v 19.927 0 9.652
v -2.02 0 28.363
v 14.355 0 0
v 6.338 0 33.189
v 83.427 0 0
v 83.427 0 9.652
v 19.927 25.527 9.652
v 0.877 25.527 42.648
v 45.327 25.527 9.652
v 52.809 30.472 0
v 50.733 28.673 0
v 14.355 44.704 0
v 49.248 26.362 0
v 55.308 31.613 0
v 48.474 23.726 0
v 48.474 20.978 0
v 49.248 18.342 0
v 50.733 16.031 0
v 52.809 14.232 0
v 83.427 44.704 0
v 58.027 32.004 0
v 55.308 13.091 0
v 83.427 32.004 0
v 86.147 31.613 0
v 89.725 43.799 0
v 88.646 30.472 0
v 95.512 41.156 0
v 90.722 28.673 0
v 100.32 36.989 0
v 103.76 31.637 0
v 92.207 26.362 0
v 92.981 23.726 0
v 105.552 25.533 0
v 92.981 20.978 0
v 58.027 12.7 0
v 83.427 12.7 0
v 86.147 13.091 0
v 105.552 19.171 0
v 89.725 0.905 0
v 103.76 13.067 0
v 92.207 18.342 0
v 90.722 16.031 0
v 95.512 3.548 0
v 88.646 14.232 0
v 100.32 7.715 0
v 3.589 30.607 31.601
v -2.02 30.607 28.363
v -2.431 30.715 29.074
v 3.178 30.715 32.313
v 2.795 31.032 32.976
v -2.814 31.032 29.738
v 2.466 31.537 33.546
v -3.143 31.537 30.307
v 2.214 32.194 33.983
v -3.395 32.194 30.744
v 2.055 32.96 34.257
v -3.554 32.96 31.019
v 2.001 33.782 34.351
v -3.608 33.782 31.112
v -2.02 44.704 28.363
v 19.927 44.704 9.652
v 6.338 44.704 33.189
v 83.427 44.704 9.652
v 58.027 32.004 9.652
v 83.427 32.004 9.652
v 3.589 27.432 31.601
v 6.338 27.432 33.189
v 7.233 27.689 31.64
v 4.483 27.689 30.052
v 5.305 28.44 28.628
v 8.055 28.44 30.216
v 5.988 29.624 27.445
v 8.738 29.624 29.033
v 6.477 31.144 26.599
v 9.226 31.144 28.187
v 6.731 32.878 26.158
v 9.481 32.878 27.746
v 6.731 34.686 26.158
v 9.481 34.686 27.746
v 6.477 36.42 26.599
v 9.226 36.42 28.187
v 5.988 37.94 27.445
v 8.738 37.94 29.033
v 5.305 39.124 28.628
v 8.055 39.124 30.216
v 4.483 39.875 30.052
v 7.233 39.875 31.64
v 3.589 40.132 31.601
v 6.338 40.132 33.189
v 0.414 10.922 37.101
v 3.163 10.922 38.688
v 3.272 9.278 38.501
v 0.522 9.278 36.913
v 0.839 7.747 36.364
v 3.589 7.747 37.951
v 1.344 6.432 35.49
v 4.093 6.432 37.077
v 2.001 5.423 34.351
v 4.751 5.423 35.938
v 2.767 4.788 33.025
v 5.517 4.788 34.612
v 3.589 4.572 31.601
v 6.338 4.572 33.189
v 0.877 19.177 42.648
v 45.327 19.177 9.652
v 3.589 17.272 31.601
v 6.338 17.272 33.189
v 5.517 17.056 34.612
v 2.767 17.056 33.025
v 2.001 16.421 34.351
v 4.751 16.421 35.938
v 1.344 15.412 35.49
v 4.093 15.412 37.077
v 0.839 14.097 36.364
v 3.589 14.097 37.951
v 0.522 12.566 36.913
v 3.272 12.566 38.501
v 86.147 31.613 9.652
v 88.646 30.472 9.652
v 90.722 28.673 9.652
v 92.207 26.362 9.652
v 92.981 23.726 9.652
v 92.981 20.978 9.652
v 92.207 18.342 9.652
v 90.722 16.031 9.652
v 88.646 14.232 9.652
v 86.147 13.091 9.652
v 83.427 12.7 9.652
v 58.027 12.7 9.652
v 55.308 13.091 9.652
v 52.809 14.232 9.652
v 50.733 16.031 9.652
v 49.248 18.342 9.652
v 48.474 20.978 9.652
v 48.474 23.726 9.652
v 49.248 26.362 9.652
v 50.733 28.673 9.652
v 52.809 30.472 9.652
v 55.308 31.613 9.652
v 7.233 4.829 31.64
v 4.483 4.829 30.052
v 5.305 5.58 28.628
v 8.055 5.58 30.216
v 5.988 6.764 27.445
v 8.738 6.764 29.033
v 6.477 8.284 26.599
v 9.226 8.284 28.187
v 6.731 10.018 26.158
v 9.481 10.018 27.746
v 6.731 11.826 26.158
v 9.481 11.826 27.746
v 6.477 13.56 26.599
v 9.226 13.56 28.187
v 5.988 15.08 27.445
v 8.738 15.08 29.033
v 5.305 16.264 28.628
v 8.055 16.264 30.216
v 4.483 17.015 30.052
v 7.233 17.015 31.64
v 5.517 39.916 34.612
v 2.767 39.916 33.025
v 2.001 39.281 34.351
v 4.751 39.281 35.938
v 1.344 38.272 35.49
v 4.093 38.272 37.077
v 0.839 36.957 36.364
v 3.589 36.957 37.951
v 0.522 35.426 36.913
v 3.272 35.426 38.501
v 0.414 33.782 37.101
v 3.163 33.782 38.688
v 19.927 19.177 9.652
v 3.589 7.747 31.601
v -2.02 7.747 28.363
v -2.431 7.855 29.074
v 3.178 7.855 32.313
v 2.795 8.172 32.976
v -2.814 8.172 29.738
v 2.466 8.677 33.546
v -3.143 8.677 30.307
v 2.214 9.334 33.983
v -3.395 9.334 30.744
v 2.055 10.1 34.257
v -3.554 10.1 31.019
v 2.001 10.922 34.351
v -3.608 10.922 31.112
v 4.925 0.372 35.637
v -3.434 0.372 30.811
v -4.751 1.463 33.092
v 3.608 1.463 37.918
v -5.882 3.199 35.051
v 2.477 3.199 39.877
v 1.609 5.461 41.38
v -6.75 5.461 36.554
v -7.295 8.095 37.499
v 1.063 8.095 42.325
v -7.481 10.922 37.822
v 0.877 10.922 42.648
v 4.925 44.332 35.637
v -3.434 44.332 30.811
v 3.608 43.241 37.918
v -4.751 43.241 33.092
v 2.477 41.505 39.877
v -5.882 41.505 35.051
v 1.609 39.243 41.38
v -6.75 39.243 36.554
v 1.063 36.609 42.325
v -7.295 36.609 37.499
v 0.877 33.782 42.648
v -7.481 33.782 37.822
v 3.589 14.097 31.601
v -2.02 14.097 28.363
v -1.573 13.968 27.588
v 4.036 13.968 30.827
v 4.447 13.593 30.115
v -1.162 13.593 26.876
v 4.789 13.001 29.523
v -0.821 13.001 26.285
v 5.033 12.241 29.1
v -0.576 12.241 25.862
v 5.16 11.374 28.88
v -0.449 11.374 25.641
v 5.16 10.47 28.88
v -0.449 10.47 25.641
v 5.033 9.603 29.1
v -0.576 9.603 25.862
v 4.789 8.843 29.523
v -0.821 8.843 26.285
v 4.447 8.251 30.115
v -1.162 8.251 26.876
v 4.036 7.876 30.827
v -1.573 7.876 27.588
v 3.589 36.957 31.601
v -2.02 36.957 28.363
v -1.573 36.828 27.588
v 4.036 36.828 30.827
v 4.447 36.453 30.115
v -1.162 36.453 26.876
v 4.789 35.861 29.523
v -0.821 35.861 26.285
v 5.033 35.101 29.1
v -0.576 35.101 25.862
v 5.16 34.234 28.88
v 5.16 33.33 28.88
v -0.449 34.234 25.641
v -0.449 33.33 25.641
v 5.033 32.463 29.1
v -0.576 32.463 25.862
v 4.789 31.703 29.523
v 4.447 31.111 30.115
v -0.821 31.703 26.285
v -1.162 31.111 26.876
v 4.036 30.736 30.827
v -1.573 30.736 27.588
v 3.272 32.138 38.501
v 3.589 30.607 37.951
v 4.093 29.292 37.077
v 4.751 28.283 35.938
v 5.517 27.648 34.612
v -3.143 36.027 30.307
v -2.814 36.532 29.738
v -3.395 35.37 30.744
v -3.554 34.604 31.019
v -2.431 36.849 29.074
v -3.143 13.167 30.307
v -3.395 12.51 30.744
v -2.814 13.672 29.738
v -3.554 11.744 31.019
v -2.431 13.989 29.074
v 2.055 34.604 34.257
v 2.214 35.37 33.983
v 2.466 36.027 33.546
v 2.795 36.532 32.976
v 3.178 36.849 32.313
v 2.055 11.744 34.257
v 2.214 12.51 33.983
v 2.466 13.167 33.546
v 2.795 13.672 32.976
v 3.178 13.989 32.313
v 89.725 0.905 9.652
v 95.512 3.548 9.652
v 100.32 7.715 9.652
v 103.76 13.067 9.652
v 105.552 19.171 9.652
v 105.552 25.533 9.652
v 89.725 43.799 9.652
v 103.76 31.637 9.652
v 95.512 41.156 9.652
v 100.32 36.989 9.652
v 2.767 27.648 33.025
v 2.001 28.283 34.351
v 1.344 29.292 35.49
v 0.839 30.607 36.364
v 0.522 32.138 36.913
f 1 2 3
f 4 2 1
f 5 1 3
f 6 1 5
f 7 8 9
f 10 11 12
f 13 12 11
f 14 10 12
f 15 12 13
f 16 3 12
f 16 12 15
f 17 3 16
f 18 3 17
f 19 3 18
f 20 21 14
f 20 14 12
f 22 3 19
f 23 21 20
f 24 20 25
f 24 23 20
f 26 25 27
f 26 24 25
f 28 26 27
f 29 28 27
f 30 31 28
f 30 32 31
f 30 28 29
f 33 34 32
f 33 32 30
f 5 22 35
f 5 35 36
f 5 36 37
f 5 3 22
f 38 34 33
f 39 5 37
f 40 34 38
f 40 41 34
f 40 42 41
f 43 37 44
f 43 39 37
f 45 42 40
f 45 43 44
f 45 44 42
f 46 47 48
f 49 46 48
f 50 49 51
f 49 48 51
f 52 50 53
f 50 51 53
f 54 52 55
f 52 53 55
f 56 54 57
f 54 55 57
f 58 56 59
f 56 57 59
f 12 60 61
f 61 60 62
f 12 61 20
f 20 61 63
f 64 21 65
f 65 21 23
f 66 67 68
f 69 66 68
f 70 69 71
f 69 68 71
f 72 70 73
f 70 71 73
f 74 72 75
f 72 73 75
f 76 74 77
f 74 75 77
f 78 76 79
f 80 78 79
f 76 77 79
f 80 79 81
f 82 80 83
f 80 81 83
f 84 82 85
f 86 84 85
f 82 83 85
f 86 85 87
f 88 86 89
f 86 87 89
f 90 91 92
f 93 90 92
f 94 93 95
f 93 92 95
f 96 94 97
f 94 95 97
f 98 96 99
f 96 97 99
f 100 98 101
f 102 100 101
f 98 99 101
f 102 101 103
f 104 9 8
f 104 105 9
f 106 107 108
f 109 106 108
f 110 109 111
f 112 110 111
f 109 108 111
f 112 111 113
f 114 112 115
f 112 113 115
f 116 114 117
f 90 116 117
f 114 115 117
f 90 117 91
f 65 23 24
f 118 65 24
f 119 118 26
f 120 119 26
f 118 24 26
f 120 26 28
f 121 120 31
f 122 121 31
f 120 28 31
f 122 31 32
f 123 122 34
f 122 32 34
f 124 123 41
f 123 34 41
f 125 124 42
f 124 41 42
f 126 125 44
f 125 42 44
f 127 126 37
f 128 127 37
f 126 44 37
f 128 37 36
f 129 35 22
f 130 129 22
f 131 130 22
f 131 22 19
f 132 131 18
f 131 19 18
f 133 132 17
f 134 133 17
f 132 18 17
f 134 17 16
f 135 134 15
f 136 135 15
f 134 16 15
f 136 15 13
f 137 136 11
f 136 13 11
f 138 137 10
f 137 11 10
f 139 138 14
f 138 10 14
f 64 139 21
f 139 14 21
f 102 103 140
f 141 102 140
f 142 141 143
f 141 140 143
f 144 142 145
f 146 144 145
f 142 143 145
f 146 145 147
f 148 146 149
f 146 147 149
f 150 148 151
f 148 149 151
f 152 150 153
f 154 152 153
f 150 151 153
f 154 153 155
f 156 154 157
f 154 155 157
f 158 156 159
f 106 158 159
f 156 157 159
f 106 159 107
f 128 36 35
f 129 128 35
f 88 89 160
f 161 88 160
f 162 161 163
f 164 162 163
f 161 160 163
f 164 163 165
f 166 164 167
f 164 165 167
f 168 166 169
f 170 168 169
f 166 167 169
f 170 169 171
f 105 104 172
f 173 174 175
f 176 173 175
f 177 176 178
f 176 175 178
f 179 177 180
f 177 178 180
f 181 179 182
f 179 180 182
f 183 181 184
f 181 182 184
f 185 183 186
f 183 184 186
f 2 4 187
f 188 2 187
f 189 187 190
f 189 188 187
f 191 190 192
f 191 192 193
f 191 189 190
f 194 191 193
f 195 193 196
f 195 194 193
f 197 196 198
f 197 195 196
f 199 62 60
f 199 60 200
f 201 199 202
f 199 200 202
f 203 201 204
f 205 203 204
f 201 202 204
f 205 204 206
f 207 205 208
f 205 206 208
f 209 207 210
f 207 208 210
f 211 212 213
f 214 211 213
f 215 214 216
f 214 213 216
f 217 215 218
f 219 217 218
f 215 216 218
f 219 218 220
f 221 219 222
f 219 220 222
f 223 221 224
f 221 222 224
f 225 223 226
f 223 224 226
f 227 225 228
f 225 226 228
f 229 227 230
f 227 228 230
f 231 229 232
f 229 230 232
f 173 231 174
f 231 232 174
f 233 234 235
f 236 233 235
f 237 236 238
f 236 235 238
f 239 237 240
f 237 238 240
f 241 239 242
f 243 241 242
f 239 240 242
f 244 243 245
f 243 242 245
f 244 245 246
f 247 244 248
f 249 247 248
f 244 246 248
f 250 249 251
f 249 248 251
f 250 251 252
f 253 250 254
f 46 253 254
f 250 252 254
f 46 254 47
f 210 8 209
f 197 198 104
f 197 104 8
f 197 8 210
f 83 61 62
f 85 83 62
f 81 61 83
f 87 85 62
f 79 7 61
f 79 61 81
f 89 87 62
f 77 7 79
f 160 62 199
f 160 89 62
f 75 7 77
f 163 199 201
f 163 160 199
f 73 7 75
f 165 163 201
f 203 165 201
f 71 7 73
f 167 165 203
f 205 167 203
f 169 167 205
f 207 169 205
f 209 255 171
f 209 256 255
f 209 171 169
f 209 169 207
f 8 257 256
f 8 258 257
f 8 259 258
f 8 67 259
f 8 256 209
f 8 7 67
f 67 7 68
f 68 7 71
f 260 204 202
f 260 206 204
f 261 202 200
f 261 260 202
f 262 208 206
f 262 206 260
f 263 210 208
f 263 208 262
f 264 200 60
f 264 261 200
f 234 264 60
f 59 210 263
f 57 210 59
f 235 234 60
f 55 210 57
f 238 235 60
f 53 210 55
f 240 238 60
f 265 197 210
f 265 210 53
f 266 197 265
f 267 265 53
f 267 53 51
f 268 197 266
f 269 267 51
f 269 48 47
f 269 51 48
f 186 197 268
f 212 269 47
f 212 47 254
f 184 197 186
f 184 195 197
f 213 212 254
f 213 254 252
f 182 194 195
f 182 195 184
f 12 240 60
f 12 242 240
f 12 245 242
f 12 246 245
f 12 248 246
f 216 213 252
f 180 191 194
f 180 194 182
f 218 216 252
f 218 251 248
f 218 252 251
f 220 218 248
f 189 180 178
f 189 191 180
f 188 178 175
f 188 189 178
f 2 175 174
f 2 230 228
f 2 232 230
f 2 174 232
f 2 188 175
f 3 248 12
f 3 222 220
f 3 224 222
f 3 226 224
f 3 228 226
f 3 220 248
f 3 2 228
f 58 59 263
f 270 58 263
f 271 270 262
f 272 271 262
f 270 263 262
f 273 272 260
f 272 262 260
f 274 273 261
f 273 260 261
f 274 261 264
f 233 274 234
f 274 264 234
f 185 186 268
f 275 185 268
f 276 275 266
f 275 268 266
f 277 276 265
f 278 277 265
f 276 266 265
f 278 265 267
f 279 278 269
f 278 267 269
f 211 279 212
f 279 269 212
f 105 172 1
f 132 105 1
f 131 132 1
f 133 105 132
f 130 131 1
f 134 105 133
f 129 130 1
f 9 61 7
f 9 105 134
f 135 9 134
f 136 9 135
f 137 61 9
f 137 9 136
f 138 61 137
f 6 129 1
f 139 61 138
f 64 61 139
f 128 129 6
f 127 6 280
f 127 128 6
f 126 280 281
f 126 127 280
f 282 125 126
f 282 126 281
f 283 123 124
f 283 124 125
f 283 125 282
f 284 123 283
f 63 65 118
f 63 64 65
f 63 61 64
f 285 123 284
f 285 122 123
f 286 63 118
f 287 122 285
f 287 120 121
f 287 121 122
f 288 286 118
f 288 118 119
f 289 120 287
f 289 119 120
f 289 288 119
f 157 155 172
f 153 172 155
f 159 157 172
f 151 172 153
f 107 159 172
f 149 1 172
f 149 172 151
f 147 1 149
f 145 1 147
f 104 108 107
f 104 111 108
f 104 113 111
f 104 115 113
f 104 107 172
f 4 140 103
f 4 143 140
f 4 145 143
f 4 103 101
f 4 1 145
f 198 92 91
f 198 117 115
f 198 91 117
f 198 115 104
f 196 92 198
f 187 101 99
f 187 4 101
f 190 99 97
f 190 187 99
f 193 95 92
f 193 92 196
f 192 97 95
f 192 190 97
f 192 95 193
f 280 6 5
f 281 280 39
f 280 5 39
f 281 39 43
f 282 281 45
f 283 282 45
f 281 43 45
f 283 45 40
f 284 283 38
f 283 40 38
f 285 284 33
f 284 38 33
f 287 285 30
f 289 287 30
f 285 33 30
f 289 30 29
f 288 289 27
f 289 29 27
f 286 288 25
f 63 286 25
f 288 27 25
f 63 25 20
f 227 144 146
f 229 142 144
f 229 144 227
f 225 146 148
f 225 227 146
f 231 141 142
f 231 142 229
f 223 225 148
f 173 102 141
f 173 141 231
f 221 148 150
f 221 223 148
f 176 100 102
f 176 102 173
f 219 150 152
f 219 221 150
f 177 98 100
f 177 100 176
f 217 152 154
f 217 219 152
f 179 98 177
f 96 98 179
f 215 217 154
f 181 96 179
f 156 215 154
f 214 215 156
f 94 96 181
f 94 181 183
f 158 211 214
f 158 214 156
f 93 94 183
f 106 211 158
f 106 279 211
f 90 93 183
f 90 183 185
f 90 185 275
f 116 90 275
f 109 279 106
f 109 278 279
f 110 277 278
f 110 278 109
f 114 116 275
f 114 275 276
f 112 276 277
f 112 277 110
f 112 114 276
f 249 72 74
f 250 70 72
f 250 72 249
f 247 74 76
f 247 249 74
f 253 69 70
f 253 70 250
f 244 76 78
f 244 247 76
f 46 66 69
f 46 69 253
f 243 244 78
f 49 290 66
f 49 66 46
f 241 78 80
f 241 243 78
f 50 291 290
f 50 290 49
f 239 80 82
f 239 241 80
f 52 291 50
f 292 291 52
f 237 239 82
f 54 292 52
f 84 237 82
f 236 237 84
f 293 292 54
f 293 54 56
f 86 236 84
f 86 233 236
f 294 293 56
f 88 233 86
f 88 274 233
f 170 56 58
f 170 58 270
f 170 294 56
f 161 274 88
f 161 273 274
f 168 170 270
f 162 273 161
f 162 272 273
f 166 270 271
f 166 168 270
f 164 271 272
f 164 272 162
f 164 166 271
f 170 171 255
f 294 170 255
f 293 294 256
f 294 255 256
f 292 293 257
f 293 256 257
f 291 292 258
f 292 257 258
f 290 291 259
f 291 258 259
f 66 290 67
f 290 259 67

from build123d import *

# Parameters (mm, degrees)
F1_DEPTH  = 9.652
F2_DEPTH  = 9.652
F4_DEPTH  = 44.704
F5_R      = 10.922
F7_DEPTH  = 3.175
F9_DEPTH  = 100.5007969078
F12_DEPTH = 3.175


with BuildPart() as f1:
    # F0 (on Top) → F1 (new body)
    with BuildSketch(Plane.XY):
        with BuildLine():
            Line((83.4274074162, 44.704), (19.9274074162, 44.704))
            Line((19.9274074162, 44.704), (19.9274074162, 0))
            Line((19.9274074162, 0), (83.4274074162, 0))
            Line((83.4274074162, 0), (83.4274074162, 12.7))
            Line((83.4274074162, 12.7), (58.0274074162, 12.7))
            ThreePointArc((58.0274074162, 12.7), (48.3754074162, 22.352), (58.0274074162, 32.004))
            Line((58.0274074162, 32.004), (83.4274074162, 32.004))
            Line((83.4274074162, 32.004), (83.4274074162, 44.704))
        make_face()
    extrude(amount=F1_DEPTH)

    # F0 (on Top) → F2 (join)
    with BuildSketch(Plane.XY):
        with BuildLine():
            ThreePointArc((83.4274074162, 0), (105.7794074162, 22.352), (83.4274074162, 44.704))
            Line((83.4274074162, 44.704), (83.4274074162, 32.004))
            ThreePointArc((83.4274074162, 32.004), (93.0794074162, 22.352), (83.4274074162, 12.7))
            Line((83.4274074162, 12.7), (83.4274074162, 0))
        make_face()
    extrude(amount=F2_DEPTH)

    # F3 (on face) → F4 (join)
    with BuildSketch(Plane.XZ):
        Polygon((19.9274074162, 0), (19.9274074162, 9.652), (0.8774074162, 42.6475678842), (-7.4814697811, 37.8215678842), (14.354822618, 0), align=None)
    extrude(amount=-F4_DEPTH)

    # F5
    f5_edges = [f1.edges().sort_by_distance(p)[0] for p in [
        (-3.302031, 0, 40.234568),
        (-3.302031, 44.704, 40.234568),
    ]]
    fillet(f5_edges, radius=F5_R)

    # F6 (on face) → F7 (cut)
    with BuildSketch(Plane(origin=(19.1249941608, 0, 11.041820527), x_dir=(0, 1, 0), z_dir=(0.8660254038, 0, 0.5))):
        with BuildLine():
            Line((17.272, 25.5731734892), (10.922, 25.5731734892))
            Line((10.922, 25.5731734892), (4.572, 25.5731734892))
            ThreePointArc((4.572, 25.5731734892), (10.922, 19.2231734892), (17.272, 25.5731734892))
        make_face()
        with BuildLine():
            Line((10.922, 31.9231734892), (10.922, 25.5731734892))
            Line((10.922, 25.5731734892), (17.272, 25.5731734892))
            ThreePointArc((17.272, 25.5731734892), (15.4121280605, 30.0633015498), (10.922, 31.9231734892))
        make_face()
        with BuildLine():
            Line((4.572, 25.5731734892), (10.922, 25.5731734892))
            Line((10.922, 25.5731734892), (10.922, 31.9231734892))
            ThreePointArc((10.922, 31.9231734892), (6.4318719395, 30.0633015498), (4.572, 25.5731734892))
        make_face()
        with BuildLine():
            ThreePointArc((33.782, 31.9231734892), (29.2918719395, 30.0633015498), (27.432, 25.5731734892))
            Line((27.432, 25.5731734892), (33.782, 25.5731734892))
            Line((33.782, 25.5731734892), (33.782, 31.9231734892))
        make_face()
        with BuildLine():
            Line((33.782, 31.9231734892), (33.782, 25.5731734892))
            Line((33.782, 25.5731734892), (40.132, 25.5731734892))
            ThreePointArc((40.132, 25.5731734892), (38.2721280605, 30.0633015498), (33.782, 31.9231734892))
        make_face()
        with BuildLine():
            Line((33.782, 25.5731734892), (27.432, 25.5731734892))
            ThreePointArc((27.432, 25.5731734892), (33.782, 19.2231734892), (40.132, 25.5731734892))
            Line((40.132, 25.5731734892), (33.782, 25.5731734892))
        make_face()
    extrude(amount=-F7_DEPTH, mode=Mode.SUBTRACT)

    # F8 (on face) → F9 (cut, through all)
    with BuildSketch(Plane(origin=(10.7661169635, 0, 6.215820527), x_dir=(0, -1, 0), z_dir=(-0.8660254038, 0, -0.5))):
        with BuildLine():
            Line((-30.607, 25.5731734892), (-33.782, 25.5731734892))
            Line((-33.782, 25.5731734892), (-36.957, 25.5731734892))
            ThreePointArc((-36.957, 25.5731734892), (-33.782, 22.3981734892), (-30.607, 25.5731734892))
        make_face()
        with BuildLine():
            Line((-33.782, 25.5731734892), (-33.782, 28.7481734892))
            ThreePointArc((-33.782, 28.7481734892), (-36.0270640303, 27.8182375195), (-36.957, 25.5731734892))
            Line((-36.957, 25.5731734892), (-33.782, 25.5731734892))
        make_face()
        with BuildLine():
            ThreePointArc((-30.607, 25.5731734892), (-31.5369359697, 27.8182375195), (-33.782, 28.7481734892))
            Line((-33.782, 28.7481734892), (-33.782, 25.5731734892))
            Line((-33.782, 25.5731734892), (-30.607, 25.5731734892))
        make_face()
        with BuildLine():
            Line((-10.922, 25.5731734892), (-10.922, 28.7481734892))
            ThreePointArc((-10.922, 28.7481734892), (-13.1670640303, 27.8182375195), (-14.097, 25.5731734892))
            Line((-14.097, 25.5731734892), (-10.922, 25.5731734892))
        make_face()
        with BuildLine():
            ThreePointArc((-7.747, 25.5731734892), (-8.6769359697, 27.8182375195), (-10.922, 28.7481734892))
            Line((-10.922, 28.7481734892), (-10.922, 25.5731734892))
            Line((-10.922, 25.5731734892), (-7.747, 25.5731734892))
        make_face()
        with BuildLine():
            Line((-10.922, 25.5731734892), (-14.097, 25.5731734892))
            ThreePointArc((-14.097, 25.5731734892), (-10.922, 22.3981734892), (-7.747, 25.5731734892))
            Line((-7.747, 25.5731734892), (-10.922, 25.5731734892))
        make_face()
    extrude(amount=-F9_DEPTH, mode=Mode.SUBTRACT)

    # F11 (on offset) → F12 (join, symmetric)
    with BuildSketch(Plane.XZ.offset(-22.352)):
        Polygon((0.8774074162, 42.6475678842), (19.9274074162, 9.652), (45.3274074162, 9.652), align=None)
    extrude(amount=F12_DEPTH, both=True)


solid = f1.part
